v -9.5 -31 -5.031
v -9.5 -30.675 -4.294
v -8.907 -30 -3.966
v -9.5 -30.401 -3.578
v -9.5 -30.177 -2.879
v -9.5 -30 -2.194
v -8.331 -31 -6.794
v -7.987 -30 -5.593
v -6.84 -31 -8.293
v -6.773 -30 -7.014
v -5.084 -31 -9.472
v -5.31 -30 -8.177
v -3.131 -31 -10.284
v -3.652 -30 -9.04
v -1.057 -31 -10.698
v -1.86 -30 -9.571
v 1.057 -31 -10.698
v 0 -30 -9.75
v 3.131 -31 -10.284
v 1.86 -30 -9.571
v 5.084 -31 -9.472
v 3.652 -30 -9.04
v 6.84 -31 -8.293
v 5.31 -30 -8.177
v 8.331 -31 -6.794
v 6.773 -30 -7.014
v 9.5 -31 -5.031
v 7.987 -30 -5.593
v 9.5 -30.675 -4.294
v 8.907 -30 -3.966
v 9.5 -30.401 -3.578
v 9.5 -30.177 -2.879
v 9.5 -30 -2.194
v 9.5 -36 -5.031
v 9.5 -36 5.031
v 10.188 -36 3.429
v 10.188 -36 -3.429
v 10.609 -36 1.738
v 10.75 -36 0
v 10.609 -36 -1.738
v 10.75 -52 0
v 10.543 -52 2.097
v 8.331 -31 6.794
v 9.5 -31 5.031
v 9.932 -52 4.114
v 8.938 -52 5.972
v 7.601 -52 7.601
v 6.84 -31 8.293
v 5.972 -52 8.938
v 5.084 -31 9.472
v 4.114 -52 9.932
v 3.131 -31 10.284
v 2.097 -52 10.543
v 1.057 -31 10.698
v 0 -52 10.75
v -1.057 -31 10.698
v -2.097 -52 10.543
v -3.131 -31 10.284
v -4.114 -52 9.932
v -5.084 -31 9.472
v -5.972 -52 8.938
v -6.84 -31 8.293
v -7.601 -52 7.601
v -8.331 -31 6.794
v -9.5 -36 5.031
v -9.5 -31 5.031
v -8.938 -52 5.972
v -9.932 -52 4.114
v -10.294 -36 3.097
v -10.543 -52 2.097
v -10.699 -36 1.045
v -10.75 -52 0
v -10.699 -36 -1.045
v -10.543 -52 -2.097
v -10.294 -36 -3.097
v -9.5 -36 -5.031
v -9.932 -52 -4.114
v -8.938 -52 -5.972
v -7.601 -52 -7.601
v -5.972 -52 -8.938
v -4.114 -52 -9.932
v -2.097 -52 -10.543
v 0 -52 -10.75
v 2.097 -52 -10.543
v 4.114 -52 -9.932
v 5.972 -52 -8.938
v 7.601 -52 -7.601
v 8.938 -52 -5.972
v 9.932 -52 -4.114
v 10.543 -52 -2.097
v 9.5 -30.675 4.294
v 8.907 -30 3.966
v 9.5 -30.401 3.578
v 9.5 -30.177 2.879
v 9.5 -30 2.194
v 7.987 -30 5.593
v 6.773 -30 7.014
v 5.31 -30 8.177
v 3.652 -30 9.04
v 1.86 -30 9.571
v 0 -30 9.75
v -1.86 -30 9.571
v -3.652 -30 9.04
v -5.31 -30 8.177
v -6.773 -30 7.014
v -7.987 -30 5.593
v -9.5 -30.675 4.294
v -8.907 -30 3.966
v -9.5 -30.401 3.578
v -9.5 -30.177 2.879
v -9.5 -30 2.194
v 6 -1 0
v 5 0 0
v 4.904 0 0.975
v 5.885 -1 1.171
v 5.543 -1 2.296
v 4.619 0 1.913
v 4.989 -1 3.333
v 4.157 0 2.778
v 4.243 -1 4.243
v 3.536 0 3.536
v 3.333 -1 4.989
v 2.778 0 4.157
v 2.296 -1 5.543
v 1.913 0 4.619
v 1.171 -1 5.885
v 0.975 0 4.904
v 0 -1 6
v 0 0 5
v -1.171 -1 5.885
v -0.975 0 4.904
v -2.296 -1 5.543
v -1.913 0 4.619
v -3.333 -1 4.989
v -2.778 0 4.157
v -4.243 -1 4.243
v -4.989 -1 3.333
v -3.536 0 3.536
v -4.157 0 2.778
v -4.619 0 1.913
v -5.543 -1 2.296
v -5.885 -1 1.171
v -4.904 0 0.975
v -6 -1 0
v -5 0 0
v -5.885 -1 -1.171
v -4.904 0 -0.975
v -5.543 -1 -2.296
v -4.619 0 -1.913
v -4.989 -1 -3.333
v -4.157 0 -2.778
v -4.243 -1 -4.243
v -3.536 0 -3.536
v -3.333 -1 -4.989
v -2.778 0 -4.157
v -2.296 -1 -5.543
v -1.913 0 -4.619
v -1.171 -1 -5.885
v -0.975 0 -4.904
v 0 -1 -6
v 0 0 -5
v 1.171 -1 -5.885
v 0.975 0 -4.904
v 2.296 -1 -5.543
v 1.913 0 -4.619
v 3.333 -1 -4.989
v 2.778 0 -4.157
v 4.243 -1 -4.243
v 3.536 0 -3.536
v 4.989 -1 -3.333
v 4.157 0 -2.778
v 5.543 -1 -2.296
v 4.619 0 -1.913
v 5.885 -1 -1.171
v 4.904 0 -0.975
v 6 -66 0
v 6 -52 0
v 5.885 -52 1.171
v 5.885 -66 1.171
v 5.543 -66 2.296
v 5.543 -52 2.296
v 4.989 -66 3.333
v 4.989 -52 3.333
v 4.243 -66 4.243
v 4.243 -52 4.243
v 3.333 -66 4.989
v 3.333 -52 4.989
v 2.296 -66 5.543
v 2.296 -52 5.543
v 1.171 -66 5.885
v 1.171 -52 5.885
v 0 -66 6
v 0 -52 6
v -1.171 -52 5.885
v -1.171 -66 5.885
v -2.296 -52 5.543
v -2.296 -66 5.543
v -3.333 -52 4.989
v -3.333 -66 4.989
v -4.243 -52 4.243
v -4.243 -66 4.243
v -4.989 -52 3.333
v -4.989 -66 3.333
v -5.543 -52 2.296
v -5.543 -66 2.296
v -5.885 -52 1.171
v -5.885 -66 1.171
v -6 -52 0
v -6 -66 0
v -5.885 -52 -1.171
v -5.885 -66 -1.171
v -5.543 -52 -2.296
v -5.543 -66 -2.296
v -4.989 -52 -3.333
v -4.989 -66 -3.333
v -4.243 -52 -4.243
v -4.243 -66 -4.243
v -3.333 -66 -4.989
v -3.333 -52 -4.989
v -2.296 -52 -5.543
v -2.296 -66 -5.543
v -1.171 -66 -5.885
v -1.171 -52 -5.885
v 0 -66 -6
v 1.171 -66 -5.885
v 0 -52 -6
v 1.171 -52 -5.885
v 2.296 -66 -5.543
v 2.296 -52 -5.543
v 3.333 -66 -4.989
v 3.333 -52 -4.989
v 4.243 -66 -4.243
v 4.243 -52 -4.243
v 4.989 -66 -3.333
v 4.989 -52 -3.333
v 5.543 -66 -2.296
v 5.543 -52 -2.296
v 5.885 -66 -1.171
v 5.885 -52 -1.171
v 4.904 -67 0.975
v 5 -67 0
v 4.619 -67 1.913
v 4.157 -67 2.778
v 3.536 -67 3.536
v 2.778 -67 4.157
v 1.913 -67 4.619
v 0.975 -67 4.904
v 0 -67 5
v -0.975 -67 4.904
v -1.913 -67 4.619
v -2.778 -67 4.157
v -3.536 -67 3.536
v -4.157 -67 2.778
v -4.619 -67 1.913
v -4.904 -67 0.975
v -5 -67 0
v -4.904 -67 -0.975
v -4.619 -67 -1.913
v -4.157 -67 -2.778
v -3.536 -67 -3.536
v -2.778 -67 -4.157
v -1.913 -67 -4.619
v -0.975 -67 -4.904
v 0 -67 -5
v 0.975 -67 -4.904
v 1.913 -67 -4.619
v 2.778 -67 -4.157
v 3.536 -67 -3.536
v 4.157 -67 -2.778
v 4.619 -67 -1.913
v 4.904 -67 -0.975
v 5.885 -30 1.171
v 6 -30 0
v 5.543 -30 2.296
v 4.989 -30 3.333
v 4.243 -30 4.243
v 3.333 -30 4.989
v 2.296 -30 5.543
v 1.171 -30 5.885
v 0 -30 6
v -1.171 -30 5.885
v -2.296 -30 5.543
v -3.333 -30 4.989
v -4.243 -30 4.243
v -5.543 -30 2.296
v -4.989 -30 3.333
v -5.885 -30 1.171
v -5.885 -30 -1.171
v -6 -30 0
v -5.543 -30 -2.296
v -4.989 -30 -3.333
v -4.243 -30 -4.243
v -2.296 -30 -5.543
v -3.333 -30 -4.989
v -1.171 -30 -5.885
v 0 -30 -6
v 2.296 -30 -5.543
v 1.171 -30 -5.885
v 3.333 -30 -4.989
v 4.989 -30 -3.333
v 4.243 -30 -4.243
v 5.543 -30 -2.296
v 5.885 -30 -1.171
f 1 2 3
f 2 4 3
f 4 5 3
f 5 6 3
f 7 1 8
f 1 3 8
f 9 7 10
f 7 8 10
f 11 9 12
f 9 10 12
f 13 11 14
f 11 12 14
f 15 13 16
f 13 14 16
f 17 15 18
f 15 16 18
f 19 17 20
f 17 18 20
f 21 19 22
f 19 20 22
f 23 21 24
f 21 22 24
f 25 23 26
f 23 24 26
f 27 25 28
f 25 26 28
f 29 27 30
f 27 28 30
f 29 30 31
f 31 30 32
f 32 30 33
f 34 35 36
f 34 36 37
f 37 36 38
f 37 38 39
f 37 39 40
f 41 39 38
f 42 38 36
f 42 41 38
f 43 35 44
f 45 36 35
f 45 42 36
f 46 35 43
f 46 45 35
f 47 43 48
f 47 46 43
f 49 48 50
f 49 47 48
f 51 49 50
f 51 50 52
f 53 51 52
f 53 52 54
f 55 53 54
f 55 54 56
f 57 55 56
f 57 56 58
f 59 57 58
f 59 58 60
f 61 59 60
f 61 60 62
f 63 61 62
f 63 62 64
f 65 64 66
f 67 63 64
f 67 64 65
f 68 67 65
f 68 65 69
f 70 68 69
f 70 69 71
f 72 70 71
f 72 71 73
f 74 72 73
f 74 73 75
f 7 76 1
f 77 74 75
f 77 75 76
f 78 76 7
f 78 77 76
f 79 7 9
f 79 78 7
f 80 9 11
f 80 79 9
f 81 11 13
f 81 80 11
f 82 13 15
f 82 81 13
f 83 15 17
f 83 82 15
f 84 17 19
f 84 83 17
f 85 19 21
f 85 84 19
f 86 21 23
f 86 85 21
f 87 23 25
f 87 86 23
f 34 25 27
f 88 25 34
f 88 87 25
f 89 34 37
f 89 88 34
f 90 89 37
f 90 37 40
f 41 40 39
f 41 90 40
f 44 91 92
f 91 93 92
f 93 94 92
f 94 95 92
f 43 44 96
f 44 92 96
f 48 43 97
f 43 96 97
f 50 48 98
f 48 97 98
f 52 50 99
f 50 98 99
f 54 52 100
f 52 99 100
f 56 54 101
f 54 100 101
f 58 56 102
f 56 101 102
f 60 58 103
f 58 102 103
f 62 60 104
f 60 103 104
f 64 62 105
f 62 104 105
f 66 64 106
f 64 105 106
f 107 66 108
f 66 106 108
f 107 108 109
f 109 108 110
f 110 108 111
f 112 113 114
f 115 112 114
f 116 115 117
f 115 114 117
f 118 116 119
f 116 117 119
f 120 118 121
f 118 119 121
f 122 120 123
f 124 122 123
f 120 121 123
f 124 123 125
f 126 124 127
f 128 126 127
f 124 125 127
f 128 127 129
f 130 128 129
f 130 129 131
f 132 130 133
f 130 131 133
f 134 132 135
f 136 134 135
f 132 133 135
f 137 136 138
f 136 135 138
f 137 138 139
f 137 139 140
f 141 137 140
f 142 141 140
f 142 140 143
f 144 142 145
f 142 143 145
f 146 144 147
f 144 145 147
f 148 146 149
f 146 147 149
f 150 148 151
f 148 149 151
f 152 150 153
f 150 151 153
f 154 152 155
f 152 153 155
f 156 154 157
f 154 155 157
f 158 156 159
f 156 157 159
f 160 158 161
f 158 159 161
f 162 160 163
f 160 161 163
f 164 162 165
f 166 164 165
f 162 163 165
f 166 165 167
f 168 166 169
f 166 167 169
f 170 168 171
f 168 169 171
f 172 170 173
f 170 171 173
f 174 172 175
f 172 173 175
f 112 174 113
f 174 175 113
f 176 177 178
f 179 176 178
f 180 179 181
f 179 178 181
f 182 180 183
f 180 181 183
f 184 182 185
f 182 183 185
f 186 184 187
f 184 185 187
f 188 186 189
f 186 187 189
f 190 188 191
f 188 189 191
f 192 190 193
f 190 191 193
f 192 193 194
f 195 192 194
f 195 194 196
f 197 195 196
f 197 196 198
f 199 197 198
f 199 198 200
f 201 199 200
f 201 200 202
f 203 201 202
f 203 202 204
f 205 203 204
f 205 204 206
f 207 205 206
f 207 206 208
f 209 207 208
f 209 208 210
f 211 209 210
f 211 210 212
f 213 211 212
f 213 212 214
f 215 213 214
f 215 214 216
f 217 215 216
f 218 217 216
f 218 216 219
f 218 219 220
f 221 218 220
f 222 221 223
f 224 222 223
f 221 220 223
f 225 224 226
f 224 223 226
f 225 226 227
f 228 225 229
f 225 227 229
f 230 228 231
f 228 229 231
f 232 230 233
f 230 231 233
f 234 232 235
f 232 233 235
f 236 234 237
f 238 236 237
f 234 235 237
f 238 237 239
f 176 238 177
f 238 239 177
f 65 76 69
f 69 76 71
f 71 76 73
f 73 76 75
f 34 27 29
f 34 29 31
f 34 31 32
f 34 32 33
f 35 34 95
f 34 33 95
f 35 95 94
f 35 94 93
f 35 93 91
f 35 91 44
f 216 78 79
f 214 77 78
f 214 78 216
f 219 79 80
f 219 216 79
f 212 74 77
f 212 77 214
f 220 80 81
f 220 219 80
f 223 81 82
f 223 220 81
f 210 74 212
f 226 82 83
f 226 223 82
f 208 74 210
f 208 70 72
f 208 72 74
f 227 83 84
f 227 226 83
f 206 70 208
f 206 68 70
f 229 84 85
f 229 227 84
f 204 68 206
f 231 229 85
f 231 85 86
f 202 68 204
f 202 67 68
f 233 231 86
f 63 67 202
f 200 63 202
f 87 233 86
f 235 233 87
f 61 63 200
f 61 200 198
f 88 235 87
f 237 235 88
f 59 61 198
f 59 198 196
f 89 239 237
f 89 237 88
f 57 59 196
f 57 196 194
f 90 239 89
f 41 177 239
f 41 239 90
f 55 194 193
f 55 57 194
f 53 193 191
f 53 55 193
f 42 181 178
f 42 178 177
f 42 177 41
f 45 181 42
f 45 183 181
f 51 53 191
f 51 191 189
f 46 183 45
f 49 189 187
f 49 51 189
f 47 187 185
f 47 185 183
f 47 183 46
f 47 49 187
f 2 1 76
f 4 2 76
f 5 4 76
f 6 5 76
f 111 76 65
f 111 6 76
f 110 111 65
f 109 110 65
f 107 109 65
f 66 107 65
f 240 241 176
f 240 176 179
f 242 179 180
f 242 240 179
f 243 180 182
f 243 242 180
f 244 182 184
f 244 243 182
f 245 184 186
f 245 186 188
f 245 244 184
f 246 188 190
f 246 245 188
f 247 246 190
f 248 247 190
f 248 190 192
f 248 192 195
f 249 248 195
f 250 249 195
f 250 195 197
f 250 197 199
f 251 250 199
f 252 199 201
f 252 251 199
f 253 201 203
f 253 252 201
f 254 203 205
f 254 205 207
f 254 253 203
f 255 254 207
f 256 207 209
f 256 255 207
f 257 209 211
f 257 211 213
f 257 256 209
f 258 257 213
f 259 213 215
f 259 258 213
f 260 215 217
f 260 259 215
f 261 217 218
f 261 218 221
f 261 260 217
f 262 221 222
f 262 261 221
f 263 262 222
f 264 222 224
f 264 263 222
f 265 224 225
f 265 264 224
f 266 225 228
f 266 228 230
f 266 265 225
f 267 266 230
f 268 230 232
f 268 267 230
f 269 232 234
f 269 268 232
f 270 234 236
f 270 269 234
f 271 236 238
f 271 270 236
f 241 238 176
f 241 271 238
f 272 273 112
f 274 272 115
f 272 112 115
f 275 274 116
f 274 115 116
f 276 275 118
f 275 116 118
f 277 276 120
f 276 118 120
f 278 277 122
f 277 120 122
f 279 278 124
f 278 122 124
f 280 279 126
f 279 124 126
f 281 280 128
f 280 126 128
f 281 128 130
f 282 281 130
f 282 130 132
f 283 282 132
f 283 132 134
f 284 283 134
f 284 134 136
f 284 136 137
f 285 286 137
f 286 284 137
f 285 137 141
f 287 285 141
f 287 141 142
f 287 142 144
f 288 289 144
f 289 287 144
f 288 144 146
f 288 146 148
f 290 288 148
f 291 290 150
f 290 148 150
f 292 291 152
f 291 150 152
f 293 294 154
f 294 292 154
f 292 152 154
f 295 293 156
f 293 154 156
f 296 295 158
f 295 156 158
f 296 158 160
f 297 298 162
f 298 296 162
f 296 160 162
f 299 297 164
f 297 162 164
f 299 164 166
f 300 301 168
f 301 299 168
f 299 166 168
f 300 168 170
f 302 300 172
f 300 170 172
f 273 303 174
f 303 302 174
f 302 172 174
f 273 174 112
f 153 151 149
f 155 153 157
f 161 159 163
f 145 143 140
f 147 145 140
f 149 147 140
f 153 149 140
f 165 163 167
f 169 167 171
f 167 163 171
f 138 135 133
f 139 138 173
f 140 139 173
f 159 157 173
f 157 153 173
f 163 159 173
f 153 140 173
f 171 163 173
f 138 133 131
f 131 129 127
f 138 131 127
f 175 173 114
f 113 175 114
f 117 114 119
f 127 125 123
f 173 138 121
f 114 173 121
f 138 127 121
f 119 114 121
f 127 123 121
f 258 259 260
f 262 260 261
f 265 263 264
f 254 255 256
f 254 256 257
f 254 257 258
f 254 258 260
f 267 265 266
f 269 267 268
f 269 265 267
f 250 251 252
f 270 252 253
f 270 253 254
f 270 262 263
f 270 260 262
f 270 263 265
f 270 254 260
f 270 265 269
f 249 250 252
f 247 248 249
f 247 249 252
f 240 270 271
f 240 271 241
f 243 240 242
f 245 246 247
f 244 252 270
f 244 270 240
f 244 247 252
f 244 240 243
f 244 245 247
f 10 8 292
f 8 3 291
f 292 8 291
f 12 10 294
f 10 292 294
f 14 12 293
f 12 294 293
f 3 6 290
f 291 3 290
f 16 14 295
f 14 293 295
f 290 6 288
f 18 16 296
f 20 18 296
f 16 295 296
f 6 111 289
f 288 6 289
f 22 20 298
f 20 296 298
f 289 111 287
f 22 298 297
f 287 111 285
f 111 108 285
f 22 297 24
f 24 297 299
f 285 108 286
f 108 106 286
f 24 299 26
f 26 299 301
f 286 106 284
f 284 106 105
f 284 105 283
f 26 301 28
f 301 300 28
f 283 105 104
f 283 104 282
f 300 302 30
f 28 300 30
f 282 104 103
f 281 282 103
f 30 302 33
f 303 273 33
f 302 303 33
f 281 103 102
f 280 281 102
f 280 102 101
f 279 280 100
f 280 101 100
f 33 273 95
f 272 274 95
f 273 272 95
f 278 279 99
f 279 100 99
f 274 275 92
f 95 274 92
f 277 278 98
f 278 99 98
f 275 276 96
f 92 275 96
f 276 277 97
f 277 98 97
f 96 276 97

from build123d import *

# Parameters (mm, degrees)
F0_R     = 6
F1_DEPTH = 67
F3_R     = 10.75
F4_DEPTH = 22
F5_W     = 26.495327
F5_H     = 31.794394
F5_W_2   = 19
F5_H_2   = 24.700004
F6_DEPTH = 6
F7_SIZE  = 1


with BuildPart() as f1:
    # F0 (on Front) → F1 (new body)
    with BuildSketch(Plane.XZ):
        Circle(F0_R)
    extrude(amount=F1_DEPTH)

    # F3 (on offset) → F4 (join)
    with BuildSketch(Plane.XZ.offset(52)):
        Circle(F3_R)
    extrude(amount=-F4_DEPTH)

    # F5 (on face) → F6 (cut)
    with BuildSketch(Plane(origin=(0, -30, 0), x_dir=(-1, 0, 0), z_dir=(0, 1, 0))):
        with Locations((-0.883178, -0.441589)):
            Rectangle(F5_W, F5_H)
        with Locations((2e-06, -0.147196)):
            Rectangle(F5_W_2, F5_H_2, mode=Mode.SUBTRACT)
    extrude(amount=-F6_DEPTH, mode=Mode.SUBTRACT)

    # F7
    f7_edges = [f1.edges().sort_by_distance(p)[0] for p in [
        (-6, -67, 0),
        (-6, 0, 0),
        (-4e-06, -30, -10.75),
        (-4e-06, -30, 10.75),
    ]]
    chamfer(f7_edges, length=F7_SIZE)


solid = f1.part
